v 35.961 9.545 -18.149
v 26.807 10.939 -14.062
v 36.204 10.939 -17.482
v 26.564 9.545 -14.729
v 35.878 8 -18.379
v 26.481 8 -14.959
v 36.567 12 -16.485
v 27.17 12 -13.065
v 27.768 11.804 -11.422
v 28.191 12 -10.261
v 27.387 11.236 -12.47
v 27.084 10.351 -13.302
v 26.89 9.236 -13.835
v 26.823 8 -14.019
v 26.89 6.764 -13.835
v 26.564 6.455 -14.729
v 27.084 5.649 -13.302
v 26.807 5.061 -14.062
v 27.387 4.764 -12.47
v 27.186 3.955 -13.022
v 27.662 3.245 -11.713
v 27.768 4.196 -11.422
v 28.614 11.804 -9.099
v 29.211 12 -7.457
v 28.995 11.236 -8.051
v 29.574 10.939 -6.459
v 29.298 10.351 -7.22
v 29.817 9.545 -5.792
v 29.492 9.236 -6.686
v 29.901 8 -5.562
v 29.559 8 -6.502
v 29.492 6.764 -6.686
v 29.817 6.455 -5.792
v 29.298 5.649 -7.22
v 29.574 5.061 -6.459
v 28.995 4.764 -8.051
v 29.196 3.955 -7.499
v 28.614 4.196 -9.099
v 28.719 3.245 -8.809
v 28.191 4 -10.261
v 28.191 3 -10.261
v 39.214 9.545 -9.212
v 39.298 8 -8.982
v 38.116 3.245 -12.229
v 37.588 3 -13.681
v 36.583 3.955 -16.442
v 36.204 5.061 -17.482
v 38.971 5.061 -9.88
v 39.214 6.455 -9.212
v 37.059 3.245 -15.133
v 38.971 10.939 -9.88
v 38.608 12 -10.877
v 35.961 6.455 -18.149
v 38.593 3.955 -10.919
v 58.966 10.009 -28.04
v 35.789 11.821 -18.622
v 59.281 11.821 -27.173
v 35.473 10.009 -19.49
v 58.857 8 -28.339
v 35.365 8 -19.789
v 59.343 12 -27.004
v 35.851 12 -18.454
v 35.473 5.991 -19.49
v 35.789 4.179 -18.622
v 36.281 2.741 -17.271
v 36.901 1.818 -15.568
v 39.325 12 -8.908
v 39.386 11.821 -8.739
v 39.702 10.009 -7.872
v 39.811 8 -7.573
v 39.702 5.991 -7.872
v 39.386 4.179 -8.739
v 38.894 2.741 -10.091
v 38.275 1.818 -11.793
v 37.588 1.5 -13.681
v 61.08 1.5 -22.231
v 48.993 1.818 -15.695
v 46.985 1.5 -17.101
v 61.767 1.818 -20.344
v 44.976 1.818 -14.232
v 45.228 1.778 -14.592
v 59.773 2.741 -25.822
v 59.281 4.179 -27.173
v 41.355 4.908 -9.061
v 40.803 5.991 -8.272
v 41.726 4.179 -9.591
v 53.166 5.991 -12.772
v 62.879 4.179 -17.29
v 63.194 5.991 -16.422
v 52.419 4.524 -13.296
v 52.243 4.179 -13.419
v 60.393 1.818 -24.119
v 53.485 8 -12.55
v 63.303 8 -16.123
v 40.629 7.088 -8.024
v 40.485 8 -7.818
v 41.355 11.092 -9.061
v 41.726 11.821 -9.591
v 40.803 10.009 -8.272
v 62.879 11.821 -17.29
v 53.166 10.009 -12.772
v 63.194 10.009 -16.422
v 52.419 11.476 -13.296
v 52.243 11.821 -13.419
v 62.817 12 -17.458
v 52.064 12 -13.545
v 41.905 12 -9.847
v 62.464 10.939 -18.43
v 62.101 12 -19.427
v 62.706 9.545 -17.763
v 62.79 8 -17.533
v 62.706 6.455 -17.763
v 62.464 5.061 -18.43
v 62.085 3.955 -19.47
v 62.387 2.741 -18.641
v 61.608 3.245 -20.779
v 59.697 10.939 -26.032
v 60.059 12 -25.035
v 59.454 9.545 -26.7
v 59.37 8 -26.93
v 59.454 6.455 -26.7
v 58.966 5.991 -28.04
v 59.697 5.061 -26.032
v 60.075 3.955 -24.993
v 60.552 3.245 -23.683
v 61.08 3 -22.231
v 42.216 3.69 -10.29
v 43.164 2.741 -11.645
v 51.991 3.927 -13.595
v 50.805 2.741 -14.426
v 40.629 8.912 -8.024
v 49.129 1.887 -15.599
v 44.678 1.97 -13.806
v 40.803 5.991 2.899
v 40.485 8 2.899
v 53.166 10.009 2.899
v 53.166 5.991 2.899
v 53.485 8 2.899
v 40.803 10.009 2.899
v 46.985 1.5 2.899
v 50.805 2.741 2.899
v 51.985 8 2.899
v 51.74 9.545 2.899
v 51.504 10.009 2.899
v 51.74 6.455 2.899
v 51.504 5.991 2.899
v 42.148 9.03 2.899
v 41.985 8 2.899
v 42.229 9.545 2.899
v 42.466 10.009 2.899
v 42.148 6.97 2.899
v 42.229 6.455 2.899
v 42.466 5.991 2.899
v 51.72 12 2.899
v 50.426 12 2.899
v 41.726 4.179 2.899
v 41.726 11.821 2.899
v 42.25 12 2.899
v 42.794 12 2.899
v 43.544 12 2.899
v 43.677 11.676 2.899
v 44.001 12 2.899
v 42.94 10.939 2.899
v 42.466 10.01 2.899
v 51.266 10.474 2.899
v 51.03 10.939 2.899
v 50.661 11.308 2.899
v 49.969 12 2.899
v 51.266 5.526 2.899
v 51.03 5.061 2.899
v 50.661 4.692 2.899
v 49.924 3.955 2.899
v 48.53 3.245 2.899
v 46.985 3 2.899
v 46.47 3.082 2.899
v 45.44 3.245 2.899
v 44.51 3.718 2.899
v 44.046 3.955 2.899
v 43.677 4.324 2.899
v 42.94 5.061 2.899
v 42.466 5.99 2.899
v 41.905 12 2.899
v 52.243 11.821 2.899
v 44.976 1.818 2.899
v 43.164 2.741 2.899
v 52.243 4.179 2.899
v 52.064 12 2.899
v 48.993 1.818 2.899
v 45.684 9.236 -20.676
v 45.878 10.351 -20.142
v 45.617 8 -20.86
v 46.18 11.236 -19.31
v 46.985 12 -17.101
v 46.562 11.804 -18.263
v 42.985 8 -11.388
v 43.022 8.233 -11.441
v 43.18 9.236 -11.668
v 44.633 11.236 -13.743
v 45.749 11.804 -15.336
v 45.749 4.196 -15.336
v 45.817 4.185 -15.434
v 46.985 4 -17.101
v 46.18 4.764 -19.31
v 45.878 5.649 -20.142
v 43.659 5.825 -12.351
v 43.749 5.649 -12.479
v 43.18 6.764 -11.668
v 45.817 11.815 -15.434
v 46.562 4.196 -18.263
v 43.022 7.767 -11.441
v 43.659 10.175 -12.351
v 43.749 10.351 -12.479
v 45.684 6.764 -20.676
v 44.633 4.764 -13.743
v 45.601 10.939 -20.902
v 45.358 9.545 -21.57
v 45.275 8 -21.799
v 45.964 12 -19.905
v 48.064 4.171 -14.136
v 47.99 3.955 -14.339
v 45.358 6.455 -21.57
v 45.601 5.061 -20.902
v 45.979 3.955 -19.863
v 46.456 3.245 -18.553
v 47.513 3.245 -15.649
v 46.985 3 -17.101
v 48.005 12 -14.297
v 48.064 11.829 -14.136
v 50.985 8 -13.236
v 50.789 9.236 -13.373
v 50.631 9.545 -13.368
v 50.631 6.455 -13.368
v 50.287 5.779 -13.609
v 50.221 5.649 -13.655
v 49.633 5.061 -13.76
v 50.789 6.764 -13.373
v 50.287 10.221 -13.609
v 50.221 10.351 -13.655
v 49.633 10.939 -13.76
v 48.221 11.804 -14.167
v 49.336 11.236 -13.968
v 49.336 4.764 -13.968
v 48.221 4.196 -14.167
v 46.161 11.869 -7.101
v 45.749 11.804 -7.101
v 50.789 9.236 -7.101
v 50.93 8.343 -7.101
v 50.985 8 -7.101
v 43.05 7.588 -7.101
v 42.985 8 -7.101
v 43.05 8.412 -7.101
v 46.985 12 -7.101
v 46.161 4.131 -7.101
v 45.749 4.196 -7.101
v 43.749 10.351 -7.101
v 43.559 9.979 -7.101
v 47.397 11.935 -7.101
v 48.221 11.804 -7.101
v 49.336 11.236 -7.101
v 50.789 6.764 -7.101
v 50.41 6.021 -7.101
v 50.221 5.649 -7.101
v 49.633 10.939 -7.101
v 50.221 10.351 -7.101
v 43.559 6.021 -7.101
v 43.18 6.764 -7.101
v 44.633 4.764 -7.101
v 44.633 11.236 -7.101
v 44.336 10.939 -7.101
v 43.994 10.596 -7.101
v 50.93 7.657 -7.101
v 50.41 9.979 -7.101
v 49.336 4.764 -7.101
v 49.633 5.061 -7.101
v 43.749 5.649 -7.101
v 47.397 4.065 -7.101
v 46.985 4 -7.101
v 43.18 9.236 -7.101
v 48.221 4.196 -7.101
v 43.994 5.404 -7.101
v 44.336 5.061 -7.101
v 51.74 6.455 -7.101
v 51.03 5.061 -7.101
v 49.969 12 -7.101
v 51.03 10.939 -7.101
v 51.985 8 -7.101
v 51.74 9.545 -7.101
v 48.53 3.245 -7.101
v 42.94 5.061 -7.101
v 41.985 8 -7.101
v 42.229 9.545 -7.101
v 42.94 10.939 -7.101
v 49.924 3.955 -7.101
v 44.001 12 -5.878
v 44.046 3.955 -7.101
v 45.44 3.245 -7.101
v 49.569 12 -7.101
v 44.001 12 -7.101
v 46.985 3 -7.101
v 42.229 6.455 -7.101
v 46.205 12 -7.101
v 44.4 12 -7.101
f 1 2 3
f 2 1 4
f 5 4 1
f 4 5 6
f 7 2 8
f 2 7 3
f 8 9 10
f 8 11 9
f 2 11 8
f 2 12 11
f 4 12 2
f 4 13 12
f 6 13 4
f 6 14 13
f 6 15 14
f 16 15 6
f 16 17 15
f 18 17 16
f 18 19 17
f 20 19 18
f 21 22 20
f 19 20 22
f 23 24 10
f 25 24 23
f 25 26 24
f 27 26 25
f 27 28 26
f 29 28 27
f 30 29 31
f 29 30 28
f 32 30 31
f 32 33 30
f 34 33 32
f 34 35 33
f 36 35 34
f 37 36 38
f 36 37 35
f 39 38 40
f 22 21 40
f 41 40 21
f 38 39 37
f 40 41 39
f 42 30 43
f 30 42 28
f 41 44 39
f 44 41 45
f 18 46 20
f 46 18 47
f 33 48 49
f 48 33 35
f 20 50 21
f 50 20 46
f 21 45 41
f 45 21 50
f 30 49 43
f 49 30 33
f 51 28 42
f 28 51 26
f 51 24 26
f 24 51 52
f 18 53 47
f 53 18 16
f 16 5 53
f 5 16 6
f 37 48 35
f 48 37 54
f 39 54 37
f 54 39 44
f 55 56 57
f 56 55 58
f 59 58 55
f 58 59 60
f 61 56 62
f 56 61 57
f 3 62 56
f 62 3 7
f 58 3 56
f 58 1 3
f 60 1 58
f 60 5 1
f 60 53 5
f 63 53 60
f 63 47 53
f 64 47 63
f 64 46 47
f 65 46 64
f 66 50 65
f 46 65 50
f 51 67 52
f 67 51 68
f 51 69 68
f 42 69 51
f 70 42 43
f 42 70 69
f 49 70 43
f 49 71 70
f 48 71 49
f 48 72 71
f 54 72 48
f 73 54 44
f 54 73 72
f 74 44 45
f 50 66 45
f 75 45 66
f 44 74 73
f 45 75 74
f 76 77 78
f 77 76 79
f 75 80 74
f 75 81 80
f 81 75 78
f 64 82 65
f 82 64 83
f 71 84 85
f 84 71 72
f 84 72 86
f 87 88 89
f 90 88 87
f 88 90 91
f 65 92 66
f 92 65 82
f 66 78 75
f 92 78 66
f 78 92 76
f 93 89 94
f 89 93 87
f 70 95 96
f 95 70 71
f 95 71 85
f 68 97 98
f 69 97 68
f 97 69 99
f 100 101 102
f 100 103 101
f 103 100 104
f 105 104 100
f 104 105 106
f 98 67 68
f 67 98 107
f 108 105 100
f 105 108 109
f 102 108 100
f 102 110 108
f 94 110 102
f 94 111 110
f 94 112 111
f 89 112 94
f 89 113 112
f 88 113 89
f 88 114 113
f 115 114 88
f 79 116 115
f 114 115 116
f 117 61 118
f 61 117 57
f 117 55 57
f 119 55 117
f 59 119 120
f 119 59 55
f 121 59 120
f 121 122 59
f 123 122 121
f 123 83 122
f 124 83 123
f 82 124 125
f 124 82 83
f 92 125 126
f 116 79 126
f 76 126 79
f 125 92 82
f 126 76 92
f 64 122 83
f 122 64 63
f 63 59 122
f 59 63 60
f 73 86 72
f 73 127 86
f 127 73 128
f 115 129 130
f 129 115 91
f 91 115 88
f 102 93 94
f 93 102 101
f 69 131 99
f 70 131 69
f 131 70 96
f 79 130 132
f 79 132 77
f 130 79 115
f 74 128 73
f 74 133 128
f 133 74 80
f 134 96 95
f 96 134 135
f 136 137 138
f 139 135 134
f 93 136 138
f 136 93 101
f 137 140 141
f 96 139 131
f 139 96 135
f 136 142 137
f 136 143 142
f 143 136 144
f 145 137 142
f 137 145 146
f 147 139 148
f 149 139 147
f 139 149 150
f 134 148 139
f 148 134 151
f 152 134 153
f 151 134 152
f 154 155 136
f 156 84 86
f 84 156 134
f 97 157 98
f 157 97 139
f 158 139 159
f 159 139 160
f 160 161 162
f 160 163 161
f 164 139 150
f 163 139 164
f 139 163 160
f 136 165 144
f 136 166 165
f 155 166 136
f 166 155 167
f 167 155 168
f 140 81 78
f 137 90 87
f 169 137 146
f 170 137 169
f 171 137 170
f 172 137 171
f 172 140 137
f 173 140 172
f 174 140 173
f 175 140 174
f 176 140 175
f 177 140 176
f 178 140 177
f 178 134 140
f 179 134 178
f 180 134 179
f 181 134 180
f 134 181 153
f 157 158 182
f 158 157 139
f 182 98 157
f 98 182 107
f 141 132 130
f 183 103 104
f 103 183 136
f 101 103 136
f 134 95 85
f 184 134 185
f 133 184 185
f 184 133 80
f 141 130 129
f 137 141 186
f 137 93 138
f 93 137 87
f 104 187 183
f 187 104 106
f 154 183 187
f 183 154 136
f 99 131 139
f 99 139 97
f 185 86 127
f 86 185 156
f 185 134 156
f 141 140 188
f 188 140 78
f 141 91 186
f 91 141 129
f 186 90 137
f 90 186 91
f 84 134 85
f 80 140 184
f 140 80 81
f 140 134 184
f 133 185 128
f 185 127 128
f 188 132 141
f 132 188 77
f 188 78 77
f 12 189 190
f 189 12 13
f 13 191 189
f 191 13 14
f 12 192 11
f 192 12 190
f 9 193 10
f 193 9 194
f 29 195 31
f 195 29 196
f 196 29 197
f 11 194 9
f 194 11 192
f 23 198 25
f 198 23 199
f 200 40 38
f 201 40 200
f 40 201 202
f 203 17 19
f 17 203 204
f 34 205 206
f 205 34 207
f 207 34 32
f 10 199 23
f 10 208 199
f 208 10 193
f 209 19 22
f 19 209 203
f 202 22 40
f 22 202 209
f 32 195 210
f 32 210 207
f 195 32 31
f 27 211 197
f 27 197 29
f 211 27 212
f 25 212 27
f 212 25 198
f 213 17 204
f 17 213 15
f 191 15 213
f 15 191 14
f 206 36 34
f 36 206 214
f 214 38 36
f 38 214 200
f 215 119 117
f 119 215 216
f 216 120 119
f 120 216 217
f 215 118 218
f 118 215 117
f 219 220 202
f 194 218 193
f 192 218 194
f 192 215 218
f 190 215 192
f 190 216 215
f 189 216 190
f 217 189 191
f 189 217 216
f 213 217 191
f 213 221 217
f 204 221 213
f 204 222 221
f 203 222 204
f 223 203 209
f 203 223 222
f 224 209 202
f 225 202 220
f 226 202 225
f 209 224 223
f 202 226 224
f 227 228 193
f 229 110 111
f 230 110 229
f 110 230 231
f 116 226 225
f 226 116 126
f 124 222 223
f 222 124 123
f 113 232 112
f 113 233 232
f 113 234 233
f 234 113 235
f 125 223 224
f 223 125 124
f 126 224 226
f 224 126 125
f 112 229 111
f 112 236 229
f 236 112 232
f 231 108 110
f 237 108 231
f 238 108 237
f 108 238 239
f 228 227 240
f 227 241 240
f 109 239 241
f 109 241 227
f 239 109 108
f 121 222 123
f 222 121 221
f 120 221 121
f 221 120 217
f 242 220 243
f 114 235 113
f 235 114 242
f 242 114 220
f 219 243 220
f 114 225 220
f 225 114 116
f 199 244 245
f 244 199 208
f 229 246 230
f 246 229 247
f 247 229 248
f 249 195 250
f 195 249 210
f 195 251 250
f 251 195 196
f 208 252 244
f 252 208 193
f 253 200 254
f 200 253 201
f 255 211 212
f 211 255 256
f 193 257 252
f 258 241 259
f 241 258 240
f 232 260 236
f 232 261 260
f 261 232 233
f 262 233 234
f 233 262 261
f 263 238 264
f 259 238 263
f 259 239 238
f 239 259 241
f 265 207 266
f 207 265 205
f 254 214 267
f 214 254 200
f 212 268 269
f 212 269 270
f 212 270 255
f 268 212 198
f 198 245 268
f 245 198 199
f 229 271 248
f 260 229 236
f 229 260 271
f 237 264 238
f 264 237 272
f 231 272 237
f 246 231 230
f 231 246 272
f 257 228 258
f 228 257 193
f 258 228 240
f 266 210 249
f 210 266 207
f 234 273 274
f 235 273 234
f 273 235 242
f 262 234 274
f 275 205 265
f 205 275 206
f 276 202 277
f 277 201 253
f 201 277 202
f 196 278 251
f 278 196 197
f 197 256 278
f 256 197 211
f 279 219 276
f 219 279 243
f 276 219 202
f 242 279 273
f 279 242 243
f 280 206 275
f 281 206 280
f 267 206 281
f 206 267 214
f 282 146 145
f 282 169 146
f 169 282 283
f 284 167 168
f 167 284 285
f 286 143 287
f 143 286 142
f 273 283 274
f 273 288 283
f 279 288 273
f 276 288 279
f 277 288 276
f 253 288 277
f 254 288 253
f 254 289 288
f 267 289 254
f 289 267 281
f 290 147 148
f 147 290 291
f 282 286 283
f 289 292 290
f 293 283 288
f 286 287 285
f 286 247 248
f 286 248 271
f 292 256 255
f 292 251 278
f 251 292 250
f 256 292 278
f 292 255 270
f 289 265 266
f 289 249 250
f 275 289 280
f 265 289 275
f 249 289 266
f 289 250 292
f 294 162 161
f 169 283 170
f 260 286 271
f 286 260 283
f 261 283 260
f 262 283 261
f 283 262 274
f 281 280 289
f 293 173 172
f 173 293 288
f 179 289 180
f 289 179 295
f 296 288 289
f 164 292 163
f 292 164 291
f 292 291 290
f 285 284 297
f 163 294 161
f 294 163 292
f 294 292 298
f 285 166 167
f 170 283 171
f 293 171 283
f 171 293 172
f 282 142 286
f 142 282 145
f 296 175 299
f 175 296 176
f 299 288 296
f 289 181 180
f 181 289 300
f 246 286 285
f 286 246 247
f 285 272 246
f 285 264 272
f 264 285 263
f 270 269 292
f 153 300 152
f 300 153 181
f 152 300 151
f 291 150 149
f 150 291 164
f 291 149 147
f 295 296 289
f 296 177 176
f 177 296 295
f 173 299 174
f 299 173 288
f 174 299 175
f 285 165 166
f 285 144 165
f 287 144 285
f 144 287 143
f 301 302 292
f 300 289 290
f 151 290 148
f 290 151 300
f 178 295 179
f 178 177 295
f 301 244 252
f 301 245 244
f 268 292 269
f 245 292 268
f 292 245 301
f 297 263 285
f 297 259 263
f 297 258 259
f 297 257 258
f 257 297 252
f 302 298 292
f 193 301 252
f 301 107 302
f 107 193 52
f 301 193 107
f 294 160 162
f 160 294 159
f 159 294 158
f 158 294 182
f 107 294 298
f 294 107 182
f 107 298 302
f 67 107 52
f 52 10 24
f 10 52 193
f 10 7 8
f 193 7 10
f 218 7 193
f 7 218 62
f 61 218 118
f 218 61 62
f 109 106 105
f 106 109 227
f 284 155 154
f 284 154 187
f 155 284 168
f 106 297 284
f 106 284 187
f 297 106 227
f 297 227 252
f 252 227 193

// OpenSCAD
// file: globs.scad
/* Global definitions for millihertz 5 */

// Ball bearings are sold as 6mm. We have seen two
// versions, one at 6.35mm (1/4") and one at 6.15mm.

ball_bearing_diameter = 6.35;
ball_bearing_radius = ball_bearing_diameter / 2;
pipe_outer_diameter = 11;
pipe_inner_diameter = 8;

/* All dimensions are in millimetres */
memory_slope = 10; // Degrees

/** Memory cell pitch - the horizontal and vertical distances between one row and the next. Memory is arranged so one column (y) make up one word. Words are laid out vertically. */
memory_cell_pitch_x = 16;
memory_cell_pitch_y = 28 * cos(memory_slope);

// Max wire diameter is 1.59mm for 6.35mm ball bearings.
stage1_wire_diameter = 1.45; // Equivalent to AWG 15 / SWG 17.
stage2_wire_diameter = 2.337; // SWG 13

/* Number of bits used in the data. This must be 32. */
bits = 32;

/* Global pitch - the horizontal spacing between each bit */
pitch = 23;

/** Frame */

frame_internal_width = 900;
frame_internal_height = 2200;

/** Frame will probably be 50mm angle iron */
frame_width = 50;

/* Bowden cable specs based on lightweight 'snake' cable */

bowden_cable_inner_diameter = 2;
bowden_cable_outer_diameter = 3.5;

bowden_cable_travel = 10;

/* Specific names for the subtractor */
subtractor_pitch_x = pitch;
subtractor_pitch_y = 27;

memory_columns_per_cell = 8;

// Memory cell height
cell_height = 14;

// Gap between two memory cell units - allows for the last useless row
// in the cell and a gap of 20 to place a delay unit if necessary. The
// delay unit may be needed to slow the ball bearing to avoid damage to
// memory selectors.
memory_unit_gap = cell_height+20;

// centre_gap is a split in the middle of the two lanes
// to join cells together (since we will likely have two
// 16-bit memory cells, and 2 16-bit adders, there will
// be a gap needed to join them.
centre_gap = 50;

/* Colour for illustrating ball bearing paths */

bb_trace_colour = [0.5,0.0,0.0,0.5];


channel_width = 7; // Width of channels ball bearings roll in

columns_per_block = 8; // Number of columns in each injector/diverter block

enumerator_rod_travel = 7;

// Used mainly by injector
function ejector_xpos(col) = 20+col*pitch+channel_width/2;


//Operator modules to produce acrylic plates easily
module vertical_plate_x()
{
  rotate([90,0,0]) linear_extrude(height=3) children();
}

module vertical_plate_y()
{
  rotate([0,0,90]) rotate([90,0,0]) linear_extrude(height=3) children();
}

module horizontal_plate()
{
  linear_extrude(height=3) children();
}


// Distance between vertical support rails (centre to centre). This is for the internal rails. There are larger superrails which connect over longer distances.
support_rail_separation = 250;

// 250mm separation gives 235mm internal spacing between bars


// Canonical channel 0 position - the leftmost channel - should be 30mm right of the centre of the rail.

/*
     30mm
   <------>
 15mm     v
<---->    v
|    |    v
|BEAM|    v
|    |    v

*/


hex_bar_af = 4.75; // 6BA hex bar from Noggin End Metals measured as 4.75mm AF.

// Calculate the max radius of the bar
hex_bar_max_radius = (hex_bar_af / 2) / cos(30);

module hex_bar_2d() {
    r = hex_bar_max_radius;
    polygon(points = [ [ r * cos(0), r * sin(0) ],
		       [ r * cos(60), r * sin(60) ],
		       [ r * cos(120), r * sin(120) ],
		       [ r * cos(180), r * sin(180) ],
		       [ r * cos(240), r * sin(240) ],
		       [ r * cos(300), r * sin(300) ] ]);
}


// X coordinate of data channel 7 entering memory, relative to the left edge of the left openbeam
data7_x = 40.5;
data7_y = -11.5;


// Perforated angle iron layout
angle_iron_internal_spacing=265;
angle_iron_hole_offset = 19.5;

slot_spacing = 50;
slot_diameter = 6;
slot_height = 28;
// main file
use <subtractor.scad>;

kerf = 0.05;


/*offset(r=kerf) {
  input_guard_top_2d();

  translate([50,0]) 
    output_guard_top_2d();
}
*/

//scale([1,-1,1])
//pipe_connector_plate();

intersection() {

  translate([0,8,0]) pipe_extender();
  translate([0,0,-30]) cube([100,12,50]);
}


//translate([330,0]) back_layer_2d();
//io_support_layer_2d();
//translate([-500,-240]) rotate(180) top_layer_2d();

//translate([0,200]) reverse_reset_lever_2d();


//scale([-1,1,1]) subtractor_bracket_left();
